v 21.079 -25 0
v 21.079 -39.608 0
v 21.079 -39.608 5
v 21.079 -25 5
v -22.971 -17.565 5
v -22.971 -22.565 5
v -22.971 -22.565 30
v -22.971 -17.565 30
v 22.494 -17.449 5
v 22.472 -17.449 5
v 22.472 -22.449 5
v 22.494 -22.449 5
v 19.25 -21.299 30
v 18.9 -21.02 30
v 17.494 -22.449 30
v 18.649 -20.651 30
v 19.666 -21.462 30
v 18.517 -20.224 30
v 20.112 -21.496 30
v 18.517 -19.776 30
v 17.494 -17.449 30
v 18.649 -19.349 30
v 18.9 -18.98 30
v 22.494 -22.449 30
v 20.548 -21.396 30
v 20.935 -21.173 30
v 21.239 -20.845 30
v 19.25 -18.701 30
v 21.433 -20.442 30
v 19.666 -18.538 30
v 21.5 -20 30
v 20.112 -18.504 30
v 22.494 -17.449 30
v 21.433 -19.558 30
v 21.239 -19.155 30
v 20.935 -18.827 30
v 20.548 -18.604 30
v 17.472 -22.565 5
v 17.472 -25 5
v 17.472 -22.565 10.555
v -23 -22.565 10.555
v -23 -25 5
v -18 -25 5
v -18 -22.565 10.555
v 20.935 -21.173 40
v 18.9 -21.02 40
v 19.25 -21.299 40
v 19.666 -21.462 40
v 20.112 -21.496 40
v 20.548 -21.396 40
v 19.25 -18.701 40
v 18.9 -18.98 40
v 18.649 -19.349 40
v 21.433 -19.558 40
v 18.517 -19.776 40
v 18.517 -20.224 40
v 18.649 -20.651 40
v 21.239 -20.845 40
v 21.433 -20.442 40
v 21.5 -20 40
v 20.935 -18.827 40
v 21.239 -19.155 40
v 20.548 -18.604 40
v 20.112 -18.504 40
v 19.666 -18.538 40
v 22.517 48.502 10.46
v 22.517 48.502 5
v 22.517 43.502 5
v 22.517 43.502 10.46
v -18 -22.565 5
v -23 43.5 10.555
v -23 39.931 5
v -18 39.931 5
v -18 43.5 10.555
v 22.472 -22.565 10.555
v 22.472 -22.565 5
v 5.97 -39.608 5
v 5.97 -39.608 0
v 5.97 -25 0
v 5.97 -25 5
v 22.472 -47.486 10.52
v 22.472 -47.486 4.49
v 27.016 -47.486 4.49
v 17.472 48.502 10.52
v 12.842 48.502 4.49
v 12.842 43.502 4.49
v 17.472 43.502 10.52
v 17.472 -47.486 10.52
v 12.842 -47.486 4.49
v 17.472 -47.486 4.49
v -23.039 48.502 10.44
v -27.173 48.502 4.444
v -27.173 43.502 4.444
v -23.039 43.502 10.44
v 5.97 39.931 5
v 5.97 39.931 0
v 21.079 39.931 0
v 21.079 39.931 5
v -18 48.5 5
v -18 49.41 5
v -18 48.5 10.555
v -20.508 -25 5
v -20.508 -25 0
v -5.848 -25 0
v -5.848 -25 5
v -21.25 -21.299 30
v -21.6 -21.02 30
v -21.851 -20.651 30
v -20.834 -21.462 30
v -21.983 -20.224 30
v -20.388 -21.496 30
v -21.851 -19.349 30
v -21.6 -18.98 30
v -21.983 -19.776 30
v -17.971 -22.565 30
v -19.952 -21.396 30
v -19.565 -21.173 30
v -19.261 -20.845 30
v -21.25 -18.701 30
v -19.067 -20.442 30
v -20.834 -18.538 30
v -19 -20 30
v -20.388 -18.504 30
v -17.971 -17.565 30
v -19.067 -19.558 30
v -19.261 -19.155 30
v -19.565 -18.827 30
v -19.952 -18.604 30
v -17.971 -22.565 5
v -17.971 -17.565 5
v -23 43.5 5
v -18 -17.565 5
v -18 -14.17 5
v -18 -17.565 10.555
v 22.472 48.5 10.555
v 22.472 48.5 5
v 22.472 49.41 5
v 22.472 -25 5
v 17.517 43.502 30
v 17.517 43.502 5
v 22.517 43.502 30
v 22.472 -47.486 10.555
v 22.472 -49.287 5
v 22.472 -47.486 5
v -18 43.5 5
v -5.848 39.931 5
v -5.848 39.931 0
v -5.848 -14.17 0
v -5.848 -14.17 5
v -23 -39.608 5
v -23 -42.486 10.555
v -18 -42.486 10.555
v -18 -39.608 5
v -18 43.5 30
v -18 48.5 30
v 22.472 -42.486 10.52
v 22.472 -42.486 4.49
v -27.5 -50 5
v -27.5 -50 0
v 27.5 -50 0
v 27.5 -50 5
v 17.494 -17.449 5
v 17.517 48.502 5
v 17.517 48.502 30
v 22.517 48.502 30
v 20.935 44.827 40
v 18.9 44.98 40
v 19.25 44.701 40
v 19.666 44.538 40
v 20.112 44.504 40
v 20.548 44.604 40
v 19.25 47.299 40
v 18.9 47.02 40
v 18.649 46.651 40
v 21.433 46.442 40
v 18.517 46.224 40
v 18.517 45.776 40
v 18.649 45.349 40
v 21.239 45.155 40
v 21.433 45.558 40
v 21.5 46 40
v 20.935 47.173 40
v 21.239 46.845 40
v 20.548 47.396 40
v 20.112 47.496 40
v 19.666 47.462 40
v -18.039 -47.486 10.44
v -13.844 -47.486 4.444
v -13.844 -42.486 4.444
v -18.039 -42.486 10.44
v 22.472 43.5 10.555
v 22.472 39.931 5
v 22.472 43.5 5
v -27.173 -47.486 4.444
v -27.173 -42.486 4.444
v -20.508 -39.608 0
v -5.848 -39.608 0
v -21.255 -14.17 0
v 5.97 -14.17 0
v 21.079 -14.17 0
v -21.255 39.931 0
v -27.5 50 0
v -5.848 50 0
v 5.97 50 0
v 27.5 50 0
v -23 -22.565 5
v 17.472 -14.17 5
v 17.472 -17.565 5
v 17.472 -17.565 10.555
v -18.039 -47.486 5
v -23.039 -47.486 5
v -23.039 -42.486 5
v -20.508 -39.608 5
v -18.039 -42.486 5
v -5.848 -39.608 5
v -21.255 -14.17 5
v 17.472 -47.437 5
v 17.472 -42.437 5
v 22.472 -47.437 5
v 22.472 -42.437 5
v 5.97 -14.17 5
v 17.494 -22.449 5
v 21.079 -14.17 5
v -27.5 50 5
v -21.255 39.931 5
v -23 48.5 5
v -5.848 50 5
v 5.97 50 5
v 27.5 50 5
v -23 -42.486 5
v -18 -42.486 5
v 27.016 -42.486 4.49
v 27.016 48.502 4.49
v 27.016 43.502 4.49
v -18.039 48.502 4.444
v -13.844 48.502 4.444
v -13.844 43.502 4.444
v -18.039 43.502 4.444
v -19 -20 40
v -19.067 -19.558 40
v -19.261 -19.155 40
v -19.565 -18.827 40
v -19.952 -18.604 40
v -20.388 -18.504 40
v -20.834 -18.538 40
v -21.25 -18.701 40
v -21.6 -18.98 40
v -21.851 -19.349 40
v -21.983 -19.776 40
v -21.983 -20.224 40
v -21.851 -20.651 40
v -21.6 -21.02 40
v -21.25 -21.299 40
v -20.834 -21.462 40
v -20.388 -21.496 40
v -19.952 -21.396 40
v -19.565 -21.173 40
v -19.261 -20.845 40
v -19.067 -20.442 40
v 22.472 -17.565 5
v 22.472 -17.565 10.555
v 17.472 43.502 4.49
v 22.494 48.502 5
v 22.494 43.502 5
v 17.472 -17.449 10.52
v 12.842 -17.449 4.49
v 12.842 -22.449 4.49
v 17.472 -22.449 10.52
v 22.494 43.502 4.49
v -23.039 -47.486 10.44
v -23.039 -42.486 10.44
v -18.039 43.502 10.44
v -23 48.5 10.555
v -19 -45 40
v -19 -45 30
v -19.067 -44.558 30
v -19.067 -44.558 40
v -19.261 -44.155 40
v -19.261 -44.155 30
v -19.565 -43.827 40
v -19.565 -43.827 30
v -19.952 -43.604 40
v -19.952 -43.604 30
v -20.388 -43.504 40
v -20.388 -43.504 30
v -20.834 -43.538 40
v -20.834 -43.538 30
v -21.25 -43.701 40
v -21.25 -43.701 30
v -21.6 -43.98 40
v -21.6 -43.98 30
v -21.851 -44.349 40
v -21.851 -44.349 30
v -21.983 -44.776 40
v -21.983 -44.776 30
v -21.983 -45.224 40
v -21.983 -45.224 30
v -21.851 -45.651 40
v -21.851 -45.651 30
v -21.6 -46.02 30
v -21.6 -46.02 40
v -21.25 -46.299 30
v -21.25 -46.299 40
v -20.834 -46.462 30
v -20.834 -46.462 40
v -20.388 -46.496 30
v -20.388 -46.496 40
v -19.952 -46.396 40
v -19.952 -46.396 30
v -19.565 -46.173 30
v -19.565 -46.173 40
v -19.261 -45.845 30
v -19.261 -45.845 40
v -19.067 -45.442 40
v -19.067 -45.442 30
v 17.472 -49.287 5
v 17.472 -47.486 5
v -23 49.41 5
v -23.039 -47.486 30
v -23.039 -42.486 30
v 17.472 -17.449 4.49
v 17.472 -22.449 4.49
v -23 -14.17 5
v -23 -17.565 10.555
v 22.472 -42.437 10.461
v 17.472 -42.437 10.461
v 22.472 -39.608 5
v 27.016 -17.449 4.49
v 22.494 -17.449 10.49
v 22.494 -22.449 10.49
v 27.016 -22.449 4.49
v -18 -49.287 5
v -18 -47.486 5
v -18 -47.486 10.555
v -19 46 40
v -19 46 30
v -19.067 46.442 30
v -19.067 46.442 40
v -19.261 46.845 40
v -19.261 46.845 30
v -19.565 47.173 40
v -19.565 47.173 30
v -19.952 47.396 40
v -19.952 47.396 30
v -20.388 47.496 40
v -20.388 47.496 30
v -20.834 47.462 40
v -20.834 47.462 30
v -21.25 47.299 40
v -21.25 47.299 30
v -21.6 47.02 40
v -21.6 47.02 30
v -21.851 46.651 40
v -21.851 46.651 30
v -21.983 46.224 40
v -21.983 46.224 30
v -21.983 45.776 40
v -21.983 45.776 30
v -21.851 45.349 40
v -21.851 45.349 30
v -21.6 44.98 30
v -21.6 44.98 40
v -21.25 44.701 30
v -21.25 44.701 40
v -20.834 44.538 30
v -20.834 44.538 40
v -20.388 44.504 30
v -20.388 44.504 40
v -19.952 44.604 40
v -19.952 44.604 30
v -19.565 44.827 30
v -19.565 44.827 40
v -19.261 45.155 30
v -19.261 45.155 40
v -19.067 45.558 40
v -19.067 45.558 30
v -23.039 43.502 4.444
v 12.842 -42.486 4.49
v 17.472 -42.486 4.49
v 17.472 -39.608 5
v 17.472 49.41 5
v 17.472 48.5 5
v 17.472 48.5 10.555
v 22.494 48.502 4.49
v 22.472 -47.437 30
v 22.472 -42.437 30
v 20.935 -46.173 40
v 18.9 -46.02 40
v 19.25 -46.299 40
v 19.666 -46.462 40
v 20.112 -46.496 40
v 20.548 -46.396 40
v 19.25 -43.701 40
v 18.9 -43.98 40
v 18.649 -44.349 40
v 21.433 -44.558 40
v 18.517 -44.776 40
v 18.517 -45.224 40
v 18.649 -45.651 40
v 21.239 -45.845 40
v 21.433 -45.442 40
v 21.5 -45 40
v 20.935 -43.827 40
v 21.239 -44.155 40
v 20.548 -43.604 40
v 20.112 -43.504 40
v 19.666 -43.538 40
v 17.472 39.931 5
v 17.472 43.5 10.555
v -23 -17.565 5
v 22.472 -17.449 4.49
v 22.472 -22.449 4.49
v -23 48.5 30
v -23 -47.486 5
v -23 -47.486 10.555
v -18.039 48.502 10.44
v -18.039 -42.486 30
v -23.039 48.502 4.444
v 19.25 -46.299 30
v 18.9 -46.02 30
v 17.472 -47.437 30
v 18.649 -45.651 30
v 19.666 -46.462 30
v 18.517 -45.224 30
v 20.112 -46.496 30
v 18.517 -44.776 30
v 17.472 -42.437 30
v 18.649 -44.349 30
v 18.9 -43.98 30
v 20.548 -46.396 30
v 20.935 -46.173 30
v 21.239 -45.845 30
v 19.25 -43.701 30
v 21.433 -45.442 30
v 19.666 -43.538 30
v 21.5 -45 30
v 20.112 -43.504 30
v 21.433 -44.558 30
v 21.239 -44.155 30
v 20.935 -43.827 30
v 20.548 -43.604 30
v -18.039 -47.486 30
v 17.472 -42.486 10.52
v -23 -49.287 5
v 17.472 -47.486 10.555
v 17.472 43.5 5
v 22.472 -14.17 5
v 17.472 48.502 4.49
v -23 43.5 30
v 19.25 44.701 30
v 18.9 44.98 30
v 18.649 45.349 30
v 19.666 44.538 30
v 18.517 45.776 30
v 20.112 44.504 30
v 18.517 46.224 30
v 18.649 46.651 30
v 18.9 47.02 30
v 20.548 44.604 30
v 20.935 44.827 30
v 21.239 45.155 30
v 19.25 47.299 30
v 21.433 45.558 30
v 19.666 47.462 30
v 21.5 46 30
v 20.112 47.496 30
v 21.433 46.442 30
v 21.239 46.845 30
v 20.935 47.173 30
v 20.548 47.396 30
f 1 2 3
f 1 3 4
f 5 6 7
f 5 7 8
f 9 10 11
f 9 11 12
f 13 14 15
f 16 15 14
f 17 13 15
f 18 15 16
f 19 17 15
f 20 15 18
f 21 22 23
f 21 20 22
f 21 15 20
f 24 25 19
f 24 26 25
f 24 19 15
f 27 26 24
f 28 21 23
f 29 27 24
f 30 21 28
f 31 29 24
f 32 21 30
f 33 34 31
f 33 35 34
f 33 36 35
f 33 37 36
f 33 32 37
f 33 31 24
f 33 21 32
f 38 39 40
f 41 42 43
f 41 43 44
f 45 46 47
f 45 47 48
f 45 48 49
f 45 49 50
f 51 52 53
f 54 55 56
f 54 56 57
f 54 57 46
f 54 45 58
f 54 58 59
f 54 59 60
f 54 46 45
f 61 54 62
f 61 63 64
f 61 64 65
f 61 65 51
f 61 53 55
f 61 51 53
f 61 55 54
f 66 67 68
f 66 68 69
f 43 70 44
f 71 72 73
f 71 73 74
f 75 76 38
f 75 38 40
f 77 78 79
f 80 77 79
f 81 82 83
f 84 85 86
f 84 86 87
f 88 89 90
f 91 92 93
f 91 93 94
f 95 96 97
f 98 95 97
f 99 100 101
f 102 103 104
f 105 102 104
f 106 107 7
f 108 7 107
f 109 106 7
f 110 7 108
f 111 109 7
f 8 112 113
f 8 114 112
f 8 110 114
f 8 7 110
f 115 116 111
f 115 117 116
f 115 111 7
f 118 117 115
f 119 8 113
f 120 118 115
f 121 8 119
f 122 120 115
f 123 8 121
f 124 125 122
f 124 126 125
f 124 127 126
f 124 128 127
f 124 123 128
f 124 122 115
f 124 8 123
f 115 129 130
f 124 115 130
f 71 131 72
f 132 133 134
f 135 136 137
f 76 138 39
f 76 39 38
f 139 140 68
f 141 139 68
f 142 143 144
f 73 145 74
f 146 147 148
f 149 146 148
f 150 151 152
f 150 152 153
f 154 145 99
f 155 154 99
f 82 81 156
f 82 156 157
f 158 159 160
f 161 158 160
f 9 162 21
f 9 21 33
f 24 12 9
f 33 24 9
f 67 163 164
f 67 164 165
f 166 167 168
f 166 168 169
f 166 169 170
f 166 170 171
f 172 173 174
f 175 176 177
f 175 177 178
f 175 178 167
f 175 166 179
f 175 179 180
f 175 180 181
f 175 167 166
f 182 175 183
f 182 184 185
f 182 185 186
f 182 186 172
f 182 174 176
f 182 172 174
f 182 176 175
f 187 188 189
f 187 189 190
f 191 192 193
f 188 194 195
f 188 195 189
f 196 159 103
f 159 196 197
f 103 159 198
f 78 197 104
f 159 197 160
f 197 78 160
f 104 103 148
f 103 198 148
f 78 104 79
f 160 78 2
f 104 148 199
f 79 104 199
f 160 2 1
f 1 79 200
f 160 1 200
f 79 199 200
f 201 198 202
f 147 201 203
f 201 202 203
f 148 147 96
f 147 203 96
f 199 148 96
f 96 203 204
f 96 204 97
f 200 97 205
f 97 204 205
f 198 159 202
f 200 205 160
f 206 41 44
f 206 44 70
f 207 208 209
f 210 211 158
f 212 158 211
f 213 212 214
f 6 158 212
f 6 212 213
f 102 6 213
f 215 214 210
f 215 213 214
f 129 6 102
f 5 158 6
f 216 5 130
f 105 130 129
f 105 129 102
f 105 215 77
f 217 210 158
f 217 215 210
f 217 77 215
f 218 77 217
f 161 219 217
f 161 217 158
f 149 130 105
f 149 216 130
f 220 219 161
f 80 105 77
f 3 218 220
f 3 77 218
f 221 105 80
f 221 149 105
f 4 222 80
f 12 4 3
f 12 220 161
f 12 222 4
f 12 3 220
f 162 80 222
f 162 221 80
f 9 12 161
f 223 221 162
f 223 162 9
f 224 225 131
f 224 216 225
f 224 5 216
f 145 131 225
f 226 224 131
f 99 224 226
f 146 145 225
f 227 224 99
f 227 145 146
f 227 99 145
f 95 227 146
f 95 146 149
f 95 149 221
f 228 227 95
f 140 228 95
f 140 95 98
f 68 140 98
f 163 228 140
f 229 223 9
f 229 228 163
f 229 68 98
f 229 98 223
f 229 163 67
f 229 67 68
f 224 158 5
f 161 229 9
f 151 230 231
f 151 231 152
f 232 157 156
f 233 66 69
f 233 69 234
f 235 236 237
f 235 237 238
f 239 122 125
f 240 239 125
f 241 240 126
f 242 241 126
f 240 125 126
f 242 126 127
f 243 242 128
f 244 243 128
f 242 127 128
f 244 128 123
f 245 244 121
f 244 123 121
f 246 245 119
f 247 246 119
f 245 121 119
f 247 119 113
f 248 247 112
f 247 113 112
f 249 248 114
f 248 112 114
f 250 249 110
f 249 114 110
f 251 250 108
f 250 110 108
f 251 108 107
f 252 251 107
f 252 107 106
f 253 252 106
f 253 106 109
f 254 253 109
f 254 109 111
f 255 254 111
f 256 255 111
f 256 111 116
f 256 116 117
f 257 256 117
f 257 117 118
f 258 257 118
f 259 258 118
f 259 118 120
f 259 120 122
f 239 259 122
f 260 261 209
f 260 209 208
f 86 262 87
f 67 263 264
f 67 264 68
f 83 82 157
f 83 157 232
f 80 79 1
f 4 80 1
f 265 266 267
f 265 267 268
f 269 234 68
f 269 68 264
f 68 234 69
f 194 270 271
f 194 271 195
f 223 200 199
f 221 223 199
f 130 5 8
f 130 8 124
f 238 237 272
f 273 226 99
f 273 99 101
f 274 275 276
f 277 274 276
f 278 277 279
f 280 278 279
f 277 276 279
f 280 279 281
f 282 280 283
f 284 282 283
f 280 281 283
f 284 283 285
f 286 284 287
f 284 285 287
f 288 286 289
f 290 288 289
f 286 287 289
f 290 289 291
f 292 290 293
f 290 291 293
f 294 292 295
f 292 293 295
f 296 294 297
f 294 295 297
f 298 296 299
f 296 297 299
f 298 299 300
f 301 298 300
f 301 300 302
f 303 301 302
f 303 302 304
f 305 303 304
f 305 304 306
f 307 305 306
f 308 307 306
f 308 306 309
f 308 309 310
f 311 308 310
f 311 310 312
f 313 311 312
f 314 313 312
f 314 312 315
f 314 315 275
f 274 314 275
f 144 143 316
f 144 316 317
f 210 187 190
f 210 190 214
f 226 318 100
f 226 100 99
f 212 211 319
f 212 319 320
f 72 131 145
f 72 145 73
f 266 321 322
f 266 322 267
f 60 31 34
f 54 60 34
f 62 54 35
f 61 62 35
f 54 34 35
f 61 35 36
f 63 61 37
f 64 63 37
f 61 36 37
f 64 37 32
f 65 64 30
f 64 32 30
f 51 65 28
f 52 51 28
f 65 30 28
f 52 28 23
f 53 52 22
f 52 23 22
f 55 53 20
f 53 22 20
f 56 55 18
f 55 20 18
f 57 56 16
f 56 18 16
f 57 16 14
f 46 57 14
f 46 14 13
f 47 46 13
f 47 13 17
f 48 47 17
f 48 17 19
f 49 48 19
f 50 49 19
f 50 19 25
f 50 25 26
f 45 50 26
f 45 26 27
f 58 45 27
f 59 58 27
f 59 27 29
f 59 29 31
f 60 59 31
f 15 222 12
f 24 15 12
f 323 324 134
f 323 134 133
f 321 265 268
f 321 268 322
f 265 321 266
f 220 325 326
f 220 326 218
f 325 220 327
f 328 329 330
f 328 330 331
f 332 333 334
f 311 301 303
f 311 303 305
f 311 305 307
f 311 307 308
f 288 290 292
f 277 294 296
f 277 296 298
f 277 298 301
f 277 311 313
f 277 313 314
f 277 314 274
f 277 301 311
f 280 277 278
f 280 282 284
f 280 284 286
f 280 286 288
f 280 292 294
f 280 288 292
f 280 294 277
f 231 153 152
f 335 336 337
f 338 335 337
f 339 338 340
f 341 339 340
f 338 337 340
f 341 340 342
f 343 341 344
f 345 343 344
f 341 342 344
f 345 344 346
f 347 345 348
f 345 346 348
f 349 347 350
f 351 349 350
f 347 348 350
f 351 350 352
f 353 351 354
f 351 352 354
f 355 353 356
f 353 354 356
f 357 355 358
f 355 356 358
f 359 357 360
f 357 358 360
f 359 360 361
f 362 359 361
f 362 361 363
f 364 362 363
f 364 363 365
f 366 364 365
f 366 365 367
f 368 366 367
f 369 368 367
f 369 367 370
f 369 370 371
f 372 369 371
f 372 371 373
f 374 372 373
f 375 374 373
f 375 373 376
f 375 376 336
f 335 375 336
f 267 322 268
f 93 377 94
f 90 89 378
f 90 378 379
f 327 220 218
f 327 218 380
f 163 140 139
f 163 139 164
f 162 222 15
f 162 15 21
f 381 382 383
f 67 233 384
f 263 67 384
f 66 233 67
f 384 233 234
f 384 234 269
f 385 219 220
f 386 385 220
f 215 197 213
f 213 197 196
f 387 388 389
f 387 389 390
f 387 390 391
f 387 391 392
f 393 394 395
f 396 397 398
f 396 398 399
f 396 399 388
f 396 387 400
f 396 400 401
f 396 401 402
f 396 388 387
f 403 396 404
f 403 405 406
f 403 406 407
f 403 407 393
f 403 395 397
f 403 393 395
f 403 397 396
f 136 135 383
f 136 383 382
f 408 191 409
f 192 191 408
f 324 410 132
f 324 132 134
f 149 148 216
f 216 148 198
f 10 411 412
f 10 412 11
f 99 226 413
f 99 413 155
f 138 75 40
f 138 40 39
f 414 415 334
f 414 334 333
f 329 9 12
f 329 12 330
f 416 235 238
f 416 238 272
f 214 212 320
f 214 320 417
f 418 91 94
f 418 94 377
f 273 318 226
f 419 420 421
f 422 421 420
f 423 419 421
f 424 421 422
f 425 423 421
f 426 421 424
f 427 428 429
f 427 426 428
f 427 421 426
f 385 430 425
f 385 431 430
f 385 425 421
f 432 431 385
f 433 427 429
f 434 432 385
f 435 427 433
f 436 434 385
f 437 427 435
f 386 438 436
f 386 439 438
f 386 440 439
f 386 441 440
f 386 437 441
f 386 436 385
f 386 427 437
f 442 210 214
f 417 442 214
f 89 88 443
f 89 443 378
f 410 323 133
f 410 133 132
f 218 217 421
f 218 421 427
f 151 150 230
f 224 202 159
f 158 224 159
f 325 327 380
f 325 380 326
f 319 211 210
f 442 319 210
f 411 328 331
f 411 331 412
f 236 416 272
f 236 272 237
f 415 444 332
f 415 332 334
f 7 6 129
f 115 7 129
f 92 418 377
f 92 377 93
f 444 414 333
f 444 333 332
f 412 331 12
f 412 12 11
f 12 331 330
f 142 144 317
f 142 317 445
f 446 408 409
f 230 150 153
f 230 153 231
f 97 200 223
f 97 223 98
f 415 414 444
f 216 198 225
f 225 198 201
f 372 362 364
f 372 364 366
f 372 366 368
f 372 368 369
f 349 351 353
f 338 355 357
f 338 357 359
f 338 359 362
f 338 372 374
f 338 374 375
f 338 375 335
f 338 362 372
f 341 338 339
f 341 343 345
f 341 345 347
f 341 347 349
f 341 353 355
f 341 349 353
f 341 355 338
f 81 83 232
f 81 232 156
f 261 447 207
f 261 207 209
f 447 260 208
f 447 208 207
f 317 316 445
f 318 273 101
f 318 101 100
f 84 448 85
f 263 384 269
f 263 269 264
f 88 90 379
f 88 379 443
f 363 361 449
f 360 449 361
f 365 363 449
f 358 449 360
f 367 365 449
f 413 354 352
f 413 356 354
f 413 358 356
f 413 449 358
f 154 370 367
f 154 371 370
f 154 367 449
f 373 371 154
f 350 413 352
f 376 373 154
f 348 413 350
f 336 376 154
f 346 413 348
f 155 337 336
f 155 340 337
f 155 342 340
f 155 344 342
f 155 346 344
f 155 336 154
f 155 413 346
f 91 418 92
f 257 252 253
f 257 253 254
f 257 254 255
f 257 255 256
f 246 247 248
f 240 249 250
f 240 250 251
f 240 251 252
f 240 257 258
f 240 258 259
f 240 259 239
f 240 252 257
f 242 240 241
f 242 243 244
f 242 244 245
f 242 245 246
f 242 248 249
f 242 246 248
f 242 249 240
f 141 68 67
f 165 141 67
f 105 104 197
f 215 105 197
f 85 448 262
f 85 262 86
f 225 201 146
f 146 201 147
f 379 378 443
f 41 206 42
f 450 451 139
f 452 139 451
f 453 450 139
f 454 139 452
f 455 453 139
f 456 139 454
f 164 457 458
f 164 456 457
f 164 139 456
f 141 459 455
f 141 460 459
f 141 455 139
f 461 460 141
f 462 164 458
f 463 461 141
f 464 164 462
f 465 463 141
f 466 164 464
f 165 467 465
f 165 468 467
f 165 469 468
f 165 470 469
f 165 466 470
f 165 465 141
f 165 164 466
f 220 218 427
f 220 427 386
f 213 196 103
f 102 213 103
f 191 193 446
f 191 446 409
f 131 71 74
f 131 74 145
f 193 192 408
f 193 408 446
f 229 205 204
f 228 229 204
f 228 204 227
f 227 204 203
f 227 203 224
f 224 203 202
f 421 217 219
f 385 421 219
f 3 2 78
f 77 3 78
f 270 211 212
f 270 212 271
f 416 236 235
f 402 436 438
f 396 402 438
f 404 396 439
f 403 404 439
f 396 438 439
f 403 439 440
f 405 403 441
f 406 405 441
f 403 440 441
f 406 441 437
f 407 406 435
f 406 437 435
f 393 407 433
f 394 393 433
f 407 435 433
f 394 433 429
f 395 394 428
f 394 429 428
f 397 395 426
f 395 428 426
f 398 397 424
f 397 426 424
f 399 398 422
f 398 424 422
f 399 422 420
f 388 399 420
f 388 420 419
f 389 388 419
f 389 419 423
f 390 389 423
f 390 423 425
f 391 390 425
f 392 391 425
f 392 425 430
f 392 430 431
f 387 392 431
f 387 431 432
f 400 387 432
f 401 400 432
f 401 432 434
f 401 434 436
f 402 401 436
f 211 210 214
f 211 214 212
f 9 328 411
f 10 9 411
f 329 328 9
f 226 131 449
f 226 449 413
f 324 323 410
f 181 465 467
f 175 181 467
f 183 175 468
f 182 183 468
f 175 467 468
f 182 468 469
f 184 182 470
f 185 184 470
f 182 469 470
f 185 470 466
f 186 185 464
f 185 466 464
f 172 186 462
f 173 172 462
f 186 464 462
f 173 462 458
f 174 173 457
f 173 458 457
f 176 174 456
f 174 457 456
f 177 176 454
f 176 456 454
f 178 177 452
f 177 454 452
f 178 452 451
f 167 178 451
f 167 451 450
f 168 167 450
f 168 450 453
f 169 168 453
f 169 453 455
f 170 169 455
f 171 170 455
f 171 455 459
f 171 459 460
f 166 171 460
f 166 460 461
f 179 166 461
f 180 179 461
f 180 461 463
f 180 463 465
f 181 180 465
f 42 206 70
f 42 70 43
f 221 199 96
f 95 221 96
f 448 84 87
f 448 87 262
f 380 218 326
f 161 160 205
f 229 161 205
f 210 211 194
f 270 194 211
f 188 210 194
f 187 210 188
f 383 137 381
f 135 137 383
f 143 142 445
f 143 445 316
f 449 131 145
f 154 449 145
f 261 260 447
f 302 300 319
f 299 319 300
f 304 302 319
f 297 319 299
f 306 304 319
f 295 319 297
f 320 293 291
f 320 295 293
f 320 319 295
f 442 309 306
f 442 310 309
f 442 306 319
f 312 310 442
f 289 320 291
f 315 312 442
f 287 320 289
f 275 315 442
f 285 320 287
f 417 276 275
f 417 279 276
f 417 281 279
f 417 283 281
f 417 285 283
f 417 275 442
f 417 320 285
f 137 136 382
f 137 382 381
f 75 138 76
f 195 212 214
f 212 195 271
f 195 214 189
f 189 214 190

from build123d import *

# Parameters (mm, degrees)
F0_W      = 6.2445142865
F0_H      = 54.1005749255
F0_W_2    = 5
F0_H_2    = 5
F0_W_3    = 11.8177030236
F0_H_3    = 10.0689709187
F0_W_4    = 6.4211731404
F0_H_4    = 10.8302235603
F0_H_5    = 14.6082099527
F0_H_6    = 10.3920206428
F0_W_5    = 6.9924706221
F1_DEPTH  = 5
F0_R      = 1.5
F2_DEPTH  = 30
F3_DEPTH  = 40
F5_DEPTH  = 5
F7_DEPTH  = 5
F9_DEPTH  = 5
F11_DEPTH = 5
F13_DEPTH = 5


# Not quite as in the source:
# - a feature names something its author has since deleted; it is built from what else it names


with BuildPart() as f1:
    # F0 (on Top) → F1 (new body)
    with BuildSketch(Plane.XY):
        with Locations((-24.3777428567, 12.8807416186)):
            Rectangle(F0_W, F0_H)
        Polygon((-21.2554857135, 39.9310290813), (-5.8475900441, 39.9310290813), (-5.8475900441, 50), (-27.5, 50), (-27.5, 39.9310290813), align=None)
        with Locations((-20.5, 46)):
            Rectangle(F0_W_2, F0_H_2, mode=Mode.SUBTRACT)
        with Locations((0.0612614676, 44.9655145407)):
            Rectangle(F0_W_3, F0_H_3)
        Polygon((21.0788268596, 39.9310290813), (27.5, 39.9310290813), (27.5, 50), (5.9701129794, 50), (5.9701129794, 39.9310290813), align=None)
        with Locations((20.0169440359, 46.0017099977)):
            Rectangle(F0_W_2, F0_H_2, mode=Mode.SUBTRACT)
        with Locations((24.2894134298, 12.8807416186)):
            Rectangle(F0_W_4, F0_H)
        with Locations((0.0612614676, 12.8807416186)):
            Rectangle(F0_W_3, F0_H)
        with Locations((0.0612614676, -19.5846576244)):
            Rectangle(F0_W_3, F0_H_4)
        with Locations((0.0612614676, -32.3038743809)):
            Rectangle(F0_W_3, F0_H_5)
        with Locations((0.0612614676, -44.8039896786)):
            Rectangle(F0_W_3, F0_H_6)
        Polygon((5.9701129794, -50), (27.5, -50), (27.5, -39.6079793572), (21.0788268596, -39.6079793572), (5.9701129794, -39.6079793572), align=None)
        with Locations((19.9717525393, -44.9374727905)):
            Rectangle(F0_W_2, F0_H_2, mode=Mode.SUBTRACT)
        Polygon((-27.5, -50), (-5.8475900441, -50), (-5.8475900441, -39.6079793572), (-20.5075293779, -39.6079793572), (-27.5, -39.6079793572), align=None)
        with Locations((-20.5385480076, -44.9859946966)):
            Rectangle(F0_W_2, F0_H_2, mode=Mode.SUBTRACT)
        with Locations((-24.003764689, -32.3038743809)):
            Rectangle(F0_W_5, F0_H_5)
        with Locations((24.2894134298, -32.3038743809)):
            Rectangle(F0_W_4, F0_H_5)
        Polygon((21.0788268596, -24.9997694045), (27.5, -24.9997694045), (27.5, -14.1695458442), (21.0788268596, -14.1695458442), (5.9701129794, -14.1695458442), (5.9701129794, -24.9997694045), align=None)
        with Locations((19.9943464249, -19.9489668012)):
            Rectangle(F0_W_2, F0_H_2, mode=Mode.SUBTRACT)
        Polygon((-20.5075293779, -24.9997694045), (-5.8475900441, -24.9997694045), (-5.8475900441, -14.1695458442), (-21.2554857135, -14.1695458442), (-27.5, -14.1695458442), (-27.5, -24.9997694045), align=None)
        with Locations((-20.4707719386, -20.0652703643)):
            Rectangle(F0_W_2, F0_H_2, mode=Mode.SUBTRACT)
    extrude(amount=F1_DEPTH)

    # F0 (on Top) → F2 (join)
    with BuildSketch(Plane.XY):
        with Locations((-20.5, 46)):
            Rectangle(F0_W_2, F0_H_2)
        with Locations((-20.5, 46)):
            Circle(F0_R, mode=Mode.SUBTRACT)
        with Locations((20.0169440359, 46.0017099977)):
            Rectangle(F0_W_2, F0_H_2)
        with Locations((20, 46)):
            Circle(F0_R, mode=Mode.SUBTRACT)
        with Locations((-20.4707719386, -20.0652703643)):
            Rectangle(F0_W_2, F0_H_2)
        with Locations((-20.5, -20)):
            Circle(F0_R, mode=Mode.SUBTRACT)
        with Locations((19.9943464249, -19.9489668012)):
            Rectangle(F0_W_2, F0_H_2)
        with Locations((20, -20)):
            Circle(F0_R, mode=Mode.SUBTRACT)
        with Locations((19.9717525393, -44.9374727905)):
            Rectangle(F0_W_2, F0_H_2)
        with Locations((20, -45)):
            Circle(F0_R, mode=Mode.SUBTRACT)
        with Locations((-20.5385480076, -44.9859946966)):
            Rectangle(F0_W_2, F0_H_2)
        with Locations((-20.5, -45)):
            Circle(F0_R, mode=Mode.SUBTRACT)
    extrude(amount=F2_DEPTH)

    # F0 (on Top) → F3 (join)
    with BuildSketch(Plane.XY):
        with Locations((-20.5, 46)):
            Circle(F0_R)
        with Locations((20, 46)):
            Circle(F0_R)
        with Locations((20, -20)):
            Circle(F0_R)
        with Locations((-20.5, -20)):
            Circle(F0_R)
        with Locations((-20.5, -45)):
            Circle(F0_R)
        with Locations((20, -45)):
            Circle(F0_R)
    extrude(amount=F3_DEPTH)


with BuildPart() as f5:
    # F4 (on face) → F5 (new body)
    with BuildSketch(Plane.XZ.offset(47.4859946966)):
        Polygon((-23.0385480076, 5), (-23.0385480076, 10.4398299009), (-27.1731745452, 4.4442578219), (-23.0385480076, 4.4442578219), (-18.0385480076, 4.4442578219), (-13.8439134623, 4.4442578219), (-18.0385480076, 10.4398299009), (-18.0385480076, 5), align=None)
    extrude(amount=-F5_DEPTH)


with BuildPart() as f5b:
    # F4 (on face) → F5, piece 2 (new body)
    with BuildSketch(Plane.XZ.offset(47.4859946966)):
        Polygon((12.8417154774, 4.4902400114), (17.4717525393, 4.4902400114), (17.4717525393, 10.5195268989), align=None)
    extrude(amount=-F5_DEPTH)


with BuildPart() as f5c:
    # F4 (on face) → F5, piece 3 (new body)
    with BuildSketch(Plane.XZ.offset(47.4859946966)):
        Polygon((22.4717525393, 10.5195268989), (22.4717525393, 4.4902400114), (27.0158294588, 4.4902400114), align=None)
    extrude(amount=-F5_DEPTH)


with BuildPart() as f7:
    # F6 (on face) → F7 (new body)
    with BuildSketch(Plane(origin=(-23, 0, 0), x_dir=(0, -1, 0), z_dir=(-1, 0, 0))):
        Polygon((49.2872789123, 5), (47.4859946966, 10.5548109859), (47.4859946966, 5), align=None)
    extrude(amount=-F7_DEPTH)


with BuildPart() as f7b:
    # F6 (on face) → F7, piece 2 (new body)
    with BuildSketch(Plane(origin=(-23, 0, 0), x_dir=(0, -1, 0), z_dir=(-1, 0, 0))):
        Polygon((42.4859946966, 5), (42.4859946966, 10.5548109859), (39.6079793572, 5), align=None)
    extrude(amount=-F7_DEPTH)


with BuildPart() as f7c:
    # F6 (on face) → F7, piece 3 (new body)
    with BuildSketch(Plane(origin=(-23, 0, 0), x_dir=(0, -1, 0), z_dir=(-1, 0, 0))):
        Polygon((22.5652703643, 10.5548109859), (22.5652703643, 5), (24.9997694045, 5), align=None)
    extrude(amount=-F7_DEPTH)


with BuildPart() as f7d:
    # F6 (on face) → F7, piece 4 (new body)
    with BuildSketch(Plane(origin=(-23, 0, 0), x_dir=(0, -1, 0), z_dir=(-1, 0, 0))):
        Polygon((14.1695458442, 5), (17.5652703643, 5), (17.5652703643, 10.5548109859), align=None)
    extrude(amount=-F7_DEPTH)


with BuildPart() as f7e:
    # F6 (on face) → F7, piece 5 (new body)
    with BuildSketch(Plane(origin=(-23, 0, 0), x_dir=(0, -1, 0), z_dir=(-1, 0, 0))):
        Polygon((-39.9310290813, 5), (-43.5, 10.5548109859), (-43.5, 5), align=None)
    extrude(amount=-F7_DEPTH)


with BuildPart() as f7f:
    # F6 (on face) → F7, piece 6 (new body)
    with BuildSketch(Plane(origin=(-23, 0, 0), x_dir=(0, -1, 0), z_dir=(-1, 0, 0))):
        Polygon((-48.5, 5), (-48.5, 10.5548109859), (-49.4102165648, 5), align=None)
    extrude(amount=-F7_DEPTH)


with BuildPart() as f9:
    # F8 (on face) → F9 (new body)
    with BuildSketch(Plane.YZ.offset(22.4717525393)):
        Polygon((-49.2872789123, 5), (-47.4859946966, 5), (-47.4859946966, 10.5548109859), align=None)
    extrude(amount=-F9_DEPTH)


with BuildPart() as f9b:
    # F8 (on face) → F9, piece 2 (new body)
    with BuildSketch(Plane.YZ.offset(22.4717525393)):
        Polygon((-39.6079793572, 5), (-42.4374727905, 10.4611596375), (-42.4374727905, 5), align=None)
    extrude(amount=-F9_DEPTH)


with BuildPart() as f9c:
    # F8 (on face) → F9, piece 3 (new body)
    with BuildSketch(Plane.YZ.offset(22.4717525393)):
        Polygon((-22.5652703643, 10.5548109859), (-24.9997694045, 5), (-22.5652703643, 5), align=None)
    extrude(amount=-F9_DEPTH)


with BuildPart() as f9d:
    # F8 (on face) → F9, piece 4 (new body)
    with BuildSketch(Plane.YZ.offset(22.4717525393)):
        Polygon((-14.1695458442, 5), (-17.5652703643, 10.5548109859), (-17.5652703643, 5), align=None)
    extrude(amount=-F9_DEPTH)


with BuildPart() as f9e:
    # F8 (on face) → F9, piece 5 (new body)
    with BuildSketch(Plane.YZ.offset(22.4717525393)):
        Polygon((43.5, 10.5548109859), (39.9310290813, 5), (43.5, 5), align=None)
    extrude(amount=-F9_DEPTH)


with BuildPart() as f9f:
    # F8 (on face) → F9, piece 6 (new body)
    with BuildSketch(Plane.YZ.offset(22.4717525393)):
        Polygon((48.5, 5), (49.4102165648, 5), (48.5, 10.5548109859), align=None)
    extrude(amount=-F9_DEPTH)


with BuildPart() as f11:
    # F10 (on face) → F11 (new body)
    with BuildSketch(Plane(origin=(0, -17.4489668012, 0), x_dir=(-1, 0, 0), z_dir=(0, 1, 0))):
        Polygon((-22.4943464249, 5), (-22.4943464249, 10.4895483089), (-27.0158294588, 4.4902400114), (-22.4717525393, 4.4902400114), (-22.4717525393, 5), align=None)
    extrude(amount=-F11_DEPTH)


with BuildPart() as f11b:
    # F10 (on face) → F11, piece 2 (new body)
    with BuildSketch(Plane(origin=(0, -17.4489668012, 0), x_dir=(-1, 0, 0), z_dir=(0, 1, 0))):
        Polygon((-17.4717525393, 4.4902400114), (-12.8417154774, 4.4902400114), (-17.4717525393, 10.5195268989), align=None)
    extrude(amount=-F11_DEPTH)


with BuildPart() as f13:
    # F12 (on face) → F13 (new body)
    with BuildSketch(Plane(origin=(0, 48.5017099977, 0), x_dir=(-1, 0, 0), z_dir=(0, 1, 0))):
        Polygon((-22.5169440359, 5), (-22.5169440359, 10.4595647761), (-27.0158294588, 4.4902400114), (-22.4943464249, 4.4902400114), (-22.4943464249, 5), align=None)
    extrude(amount=-F13_DEPTH)


with BuildPart() as f13b:
    # F12 (on face) → F13, piece 2 (new body)
    with BuildSketch(Plane(origin=(0, 48.5017099977, 0), x_dir=(-1, 0, 0), z_dir=(0, 1, 0))):
        Polygon((-12.8417154774, 4.4902400114), (-17.4717525393, 10.5195268989), (-17.4717525393, 4.4902400114), align=None)
    extrude(amount=-F13_DEPTH)


with BuildPart() as f13c:
    # F12 (on face) → F13, piece 3 (new body)
    with BuildSketch(Plane(origin=(0, 48.5017099977, 0), x_dir=(-1, 0, 0), z_dir=(0, 1, 0))):
        Polygon((13.8439134623, 4.4442578219), (18.0385480076, 4.4442578219), (18.0385480076, 10.4398299009), align=None)
    extrude(amount=-F13_DEPTH)


with BuildPart() as f13d:
    # F12 (on face) → F13, piece 4 (new body)
    with BuildSketch(Plane(origin=(0, 48.5017099977, 0), x_dir=(-1, 0, 0), z_dir=(0, 1, 0))):
        Polygon((27.1731745452, 4.4442578219), (23.0385480076, 10.4398299009), (23.0385480076, 4.4442578219), align=None)
    extrude(amount=-F13_DEPTH)


solid = Compound([f1.part, f5.part, f5b.part, f5c.part, f7.part, f7b.part, f7c.part, f7d.part, f7e.part, f7f.part, f9.part, f9b.part, f9c.part, f9d.part, f9e.part, f9f.part, f11.part, f11b.part, f13.part, f13b.part, f13c.part, f13d.part])
